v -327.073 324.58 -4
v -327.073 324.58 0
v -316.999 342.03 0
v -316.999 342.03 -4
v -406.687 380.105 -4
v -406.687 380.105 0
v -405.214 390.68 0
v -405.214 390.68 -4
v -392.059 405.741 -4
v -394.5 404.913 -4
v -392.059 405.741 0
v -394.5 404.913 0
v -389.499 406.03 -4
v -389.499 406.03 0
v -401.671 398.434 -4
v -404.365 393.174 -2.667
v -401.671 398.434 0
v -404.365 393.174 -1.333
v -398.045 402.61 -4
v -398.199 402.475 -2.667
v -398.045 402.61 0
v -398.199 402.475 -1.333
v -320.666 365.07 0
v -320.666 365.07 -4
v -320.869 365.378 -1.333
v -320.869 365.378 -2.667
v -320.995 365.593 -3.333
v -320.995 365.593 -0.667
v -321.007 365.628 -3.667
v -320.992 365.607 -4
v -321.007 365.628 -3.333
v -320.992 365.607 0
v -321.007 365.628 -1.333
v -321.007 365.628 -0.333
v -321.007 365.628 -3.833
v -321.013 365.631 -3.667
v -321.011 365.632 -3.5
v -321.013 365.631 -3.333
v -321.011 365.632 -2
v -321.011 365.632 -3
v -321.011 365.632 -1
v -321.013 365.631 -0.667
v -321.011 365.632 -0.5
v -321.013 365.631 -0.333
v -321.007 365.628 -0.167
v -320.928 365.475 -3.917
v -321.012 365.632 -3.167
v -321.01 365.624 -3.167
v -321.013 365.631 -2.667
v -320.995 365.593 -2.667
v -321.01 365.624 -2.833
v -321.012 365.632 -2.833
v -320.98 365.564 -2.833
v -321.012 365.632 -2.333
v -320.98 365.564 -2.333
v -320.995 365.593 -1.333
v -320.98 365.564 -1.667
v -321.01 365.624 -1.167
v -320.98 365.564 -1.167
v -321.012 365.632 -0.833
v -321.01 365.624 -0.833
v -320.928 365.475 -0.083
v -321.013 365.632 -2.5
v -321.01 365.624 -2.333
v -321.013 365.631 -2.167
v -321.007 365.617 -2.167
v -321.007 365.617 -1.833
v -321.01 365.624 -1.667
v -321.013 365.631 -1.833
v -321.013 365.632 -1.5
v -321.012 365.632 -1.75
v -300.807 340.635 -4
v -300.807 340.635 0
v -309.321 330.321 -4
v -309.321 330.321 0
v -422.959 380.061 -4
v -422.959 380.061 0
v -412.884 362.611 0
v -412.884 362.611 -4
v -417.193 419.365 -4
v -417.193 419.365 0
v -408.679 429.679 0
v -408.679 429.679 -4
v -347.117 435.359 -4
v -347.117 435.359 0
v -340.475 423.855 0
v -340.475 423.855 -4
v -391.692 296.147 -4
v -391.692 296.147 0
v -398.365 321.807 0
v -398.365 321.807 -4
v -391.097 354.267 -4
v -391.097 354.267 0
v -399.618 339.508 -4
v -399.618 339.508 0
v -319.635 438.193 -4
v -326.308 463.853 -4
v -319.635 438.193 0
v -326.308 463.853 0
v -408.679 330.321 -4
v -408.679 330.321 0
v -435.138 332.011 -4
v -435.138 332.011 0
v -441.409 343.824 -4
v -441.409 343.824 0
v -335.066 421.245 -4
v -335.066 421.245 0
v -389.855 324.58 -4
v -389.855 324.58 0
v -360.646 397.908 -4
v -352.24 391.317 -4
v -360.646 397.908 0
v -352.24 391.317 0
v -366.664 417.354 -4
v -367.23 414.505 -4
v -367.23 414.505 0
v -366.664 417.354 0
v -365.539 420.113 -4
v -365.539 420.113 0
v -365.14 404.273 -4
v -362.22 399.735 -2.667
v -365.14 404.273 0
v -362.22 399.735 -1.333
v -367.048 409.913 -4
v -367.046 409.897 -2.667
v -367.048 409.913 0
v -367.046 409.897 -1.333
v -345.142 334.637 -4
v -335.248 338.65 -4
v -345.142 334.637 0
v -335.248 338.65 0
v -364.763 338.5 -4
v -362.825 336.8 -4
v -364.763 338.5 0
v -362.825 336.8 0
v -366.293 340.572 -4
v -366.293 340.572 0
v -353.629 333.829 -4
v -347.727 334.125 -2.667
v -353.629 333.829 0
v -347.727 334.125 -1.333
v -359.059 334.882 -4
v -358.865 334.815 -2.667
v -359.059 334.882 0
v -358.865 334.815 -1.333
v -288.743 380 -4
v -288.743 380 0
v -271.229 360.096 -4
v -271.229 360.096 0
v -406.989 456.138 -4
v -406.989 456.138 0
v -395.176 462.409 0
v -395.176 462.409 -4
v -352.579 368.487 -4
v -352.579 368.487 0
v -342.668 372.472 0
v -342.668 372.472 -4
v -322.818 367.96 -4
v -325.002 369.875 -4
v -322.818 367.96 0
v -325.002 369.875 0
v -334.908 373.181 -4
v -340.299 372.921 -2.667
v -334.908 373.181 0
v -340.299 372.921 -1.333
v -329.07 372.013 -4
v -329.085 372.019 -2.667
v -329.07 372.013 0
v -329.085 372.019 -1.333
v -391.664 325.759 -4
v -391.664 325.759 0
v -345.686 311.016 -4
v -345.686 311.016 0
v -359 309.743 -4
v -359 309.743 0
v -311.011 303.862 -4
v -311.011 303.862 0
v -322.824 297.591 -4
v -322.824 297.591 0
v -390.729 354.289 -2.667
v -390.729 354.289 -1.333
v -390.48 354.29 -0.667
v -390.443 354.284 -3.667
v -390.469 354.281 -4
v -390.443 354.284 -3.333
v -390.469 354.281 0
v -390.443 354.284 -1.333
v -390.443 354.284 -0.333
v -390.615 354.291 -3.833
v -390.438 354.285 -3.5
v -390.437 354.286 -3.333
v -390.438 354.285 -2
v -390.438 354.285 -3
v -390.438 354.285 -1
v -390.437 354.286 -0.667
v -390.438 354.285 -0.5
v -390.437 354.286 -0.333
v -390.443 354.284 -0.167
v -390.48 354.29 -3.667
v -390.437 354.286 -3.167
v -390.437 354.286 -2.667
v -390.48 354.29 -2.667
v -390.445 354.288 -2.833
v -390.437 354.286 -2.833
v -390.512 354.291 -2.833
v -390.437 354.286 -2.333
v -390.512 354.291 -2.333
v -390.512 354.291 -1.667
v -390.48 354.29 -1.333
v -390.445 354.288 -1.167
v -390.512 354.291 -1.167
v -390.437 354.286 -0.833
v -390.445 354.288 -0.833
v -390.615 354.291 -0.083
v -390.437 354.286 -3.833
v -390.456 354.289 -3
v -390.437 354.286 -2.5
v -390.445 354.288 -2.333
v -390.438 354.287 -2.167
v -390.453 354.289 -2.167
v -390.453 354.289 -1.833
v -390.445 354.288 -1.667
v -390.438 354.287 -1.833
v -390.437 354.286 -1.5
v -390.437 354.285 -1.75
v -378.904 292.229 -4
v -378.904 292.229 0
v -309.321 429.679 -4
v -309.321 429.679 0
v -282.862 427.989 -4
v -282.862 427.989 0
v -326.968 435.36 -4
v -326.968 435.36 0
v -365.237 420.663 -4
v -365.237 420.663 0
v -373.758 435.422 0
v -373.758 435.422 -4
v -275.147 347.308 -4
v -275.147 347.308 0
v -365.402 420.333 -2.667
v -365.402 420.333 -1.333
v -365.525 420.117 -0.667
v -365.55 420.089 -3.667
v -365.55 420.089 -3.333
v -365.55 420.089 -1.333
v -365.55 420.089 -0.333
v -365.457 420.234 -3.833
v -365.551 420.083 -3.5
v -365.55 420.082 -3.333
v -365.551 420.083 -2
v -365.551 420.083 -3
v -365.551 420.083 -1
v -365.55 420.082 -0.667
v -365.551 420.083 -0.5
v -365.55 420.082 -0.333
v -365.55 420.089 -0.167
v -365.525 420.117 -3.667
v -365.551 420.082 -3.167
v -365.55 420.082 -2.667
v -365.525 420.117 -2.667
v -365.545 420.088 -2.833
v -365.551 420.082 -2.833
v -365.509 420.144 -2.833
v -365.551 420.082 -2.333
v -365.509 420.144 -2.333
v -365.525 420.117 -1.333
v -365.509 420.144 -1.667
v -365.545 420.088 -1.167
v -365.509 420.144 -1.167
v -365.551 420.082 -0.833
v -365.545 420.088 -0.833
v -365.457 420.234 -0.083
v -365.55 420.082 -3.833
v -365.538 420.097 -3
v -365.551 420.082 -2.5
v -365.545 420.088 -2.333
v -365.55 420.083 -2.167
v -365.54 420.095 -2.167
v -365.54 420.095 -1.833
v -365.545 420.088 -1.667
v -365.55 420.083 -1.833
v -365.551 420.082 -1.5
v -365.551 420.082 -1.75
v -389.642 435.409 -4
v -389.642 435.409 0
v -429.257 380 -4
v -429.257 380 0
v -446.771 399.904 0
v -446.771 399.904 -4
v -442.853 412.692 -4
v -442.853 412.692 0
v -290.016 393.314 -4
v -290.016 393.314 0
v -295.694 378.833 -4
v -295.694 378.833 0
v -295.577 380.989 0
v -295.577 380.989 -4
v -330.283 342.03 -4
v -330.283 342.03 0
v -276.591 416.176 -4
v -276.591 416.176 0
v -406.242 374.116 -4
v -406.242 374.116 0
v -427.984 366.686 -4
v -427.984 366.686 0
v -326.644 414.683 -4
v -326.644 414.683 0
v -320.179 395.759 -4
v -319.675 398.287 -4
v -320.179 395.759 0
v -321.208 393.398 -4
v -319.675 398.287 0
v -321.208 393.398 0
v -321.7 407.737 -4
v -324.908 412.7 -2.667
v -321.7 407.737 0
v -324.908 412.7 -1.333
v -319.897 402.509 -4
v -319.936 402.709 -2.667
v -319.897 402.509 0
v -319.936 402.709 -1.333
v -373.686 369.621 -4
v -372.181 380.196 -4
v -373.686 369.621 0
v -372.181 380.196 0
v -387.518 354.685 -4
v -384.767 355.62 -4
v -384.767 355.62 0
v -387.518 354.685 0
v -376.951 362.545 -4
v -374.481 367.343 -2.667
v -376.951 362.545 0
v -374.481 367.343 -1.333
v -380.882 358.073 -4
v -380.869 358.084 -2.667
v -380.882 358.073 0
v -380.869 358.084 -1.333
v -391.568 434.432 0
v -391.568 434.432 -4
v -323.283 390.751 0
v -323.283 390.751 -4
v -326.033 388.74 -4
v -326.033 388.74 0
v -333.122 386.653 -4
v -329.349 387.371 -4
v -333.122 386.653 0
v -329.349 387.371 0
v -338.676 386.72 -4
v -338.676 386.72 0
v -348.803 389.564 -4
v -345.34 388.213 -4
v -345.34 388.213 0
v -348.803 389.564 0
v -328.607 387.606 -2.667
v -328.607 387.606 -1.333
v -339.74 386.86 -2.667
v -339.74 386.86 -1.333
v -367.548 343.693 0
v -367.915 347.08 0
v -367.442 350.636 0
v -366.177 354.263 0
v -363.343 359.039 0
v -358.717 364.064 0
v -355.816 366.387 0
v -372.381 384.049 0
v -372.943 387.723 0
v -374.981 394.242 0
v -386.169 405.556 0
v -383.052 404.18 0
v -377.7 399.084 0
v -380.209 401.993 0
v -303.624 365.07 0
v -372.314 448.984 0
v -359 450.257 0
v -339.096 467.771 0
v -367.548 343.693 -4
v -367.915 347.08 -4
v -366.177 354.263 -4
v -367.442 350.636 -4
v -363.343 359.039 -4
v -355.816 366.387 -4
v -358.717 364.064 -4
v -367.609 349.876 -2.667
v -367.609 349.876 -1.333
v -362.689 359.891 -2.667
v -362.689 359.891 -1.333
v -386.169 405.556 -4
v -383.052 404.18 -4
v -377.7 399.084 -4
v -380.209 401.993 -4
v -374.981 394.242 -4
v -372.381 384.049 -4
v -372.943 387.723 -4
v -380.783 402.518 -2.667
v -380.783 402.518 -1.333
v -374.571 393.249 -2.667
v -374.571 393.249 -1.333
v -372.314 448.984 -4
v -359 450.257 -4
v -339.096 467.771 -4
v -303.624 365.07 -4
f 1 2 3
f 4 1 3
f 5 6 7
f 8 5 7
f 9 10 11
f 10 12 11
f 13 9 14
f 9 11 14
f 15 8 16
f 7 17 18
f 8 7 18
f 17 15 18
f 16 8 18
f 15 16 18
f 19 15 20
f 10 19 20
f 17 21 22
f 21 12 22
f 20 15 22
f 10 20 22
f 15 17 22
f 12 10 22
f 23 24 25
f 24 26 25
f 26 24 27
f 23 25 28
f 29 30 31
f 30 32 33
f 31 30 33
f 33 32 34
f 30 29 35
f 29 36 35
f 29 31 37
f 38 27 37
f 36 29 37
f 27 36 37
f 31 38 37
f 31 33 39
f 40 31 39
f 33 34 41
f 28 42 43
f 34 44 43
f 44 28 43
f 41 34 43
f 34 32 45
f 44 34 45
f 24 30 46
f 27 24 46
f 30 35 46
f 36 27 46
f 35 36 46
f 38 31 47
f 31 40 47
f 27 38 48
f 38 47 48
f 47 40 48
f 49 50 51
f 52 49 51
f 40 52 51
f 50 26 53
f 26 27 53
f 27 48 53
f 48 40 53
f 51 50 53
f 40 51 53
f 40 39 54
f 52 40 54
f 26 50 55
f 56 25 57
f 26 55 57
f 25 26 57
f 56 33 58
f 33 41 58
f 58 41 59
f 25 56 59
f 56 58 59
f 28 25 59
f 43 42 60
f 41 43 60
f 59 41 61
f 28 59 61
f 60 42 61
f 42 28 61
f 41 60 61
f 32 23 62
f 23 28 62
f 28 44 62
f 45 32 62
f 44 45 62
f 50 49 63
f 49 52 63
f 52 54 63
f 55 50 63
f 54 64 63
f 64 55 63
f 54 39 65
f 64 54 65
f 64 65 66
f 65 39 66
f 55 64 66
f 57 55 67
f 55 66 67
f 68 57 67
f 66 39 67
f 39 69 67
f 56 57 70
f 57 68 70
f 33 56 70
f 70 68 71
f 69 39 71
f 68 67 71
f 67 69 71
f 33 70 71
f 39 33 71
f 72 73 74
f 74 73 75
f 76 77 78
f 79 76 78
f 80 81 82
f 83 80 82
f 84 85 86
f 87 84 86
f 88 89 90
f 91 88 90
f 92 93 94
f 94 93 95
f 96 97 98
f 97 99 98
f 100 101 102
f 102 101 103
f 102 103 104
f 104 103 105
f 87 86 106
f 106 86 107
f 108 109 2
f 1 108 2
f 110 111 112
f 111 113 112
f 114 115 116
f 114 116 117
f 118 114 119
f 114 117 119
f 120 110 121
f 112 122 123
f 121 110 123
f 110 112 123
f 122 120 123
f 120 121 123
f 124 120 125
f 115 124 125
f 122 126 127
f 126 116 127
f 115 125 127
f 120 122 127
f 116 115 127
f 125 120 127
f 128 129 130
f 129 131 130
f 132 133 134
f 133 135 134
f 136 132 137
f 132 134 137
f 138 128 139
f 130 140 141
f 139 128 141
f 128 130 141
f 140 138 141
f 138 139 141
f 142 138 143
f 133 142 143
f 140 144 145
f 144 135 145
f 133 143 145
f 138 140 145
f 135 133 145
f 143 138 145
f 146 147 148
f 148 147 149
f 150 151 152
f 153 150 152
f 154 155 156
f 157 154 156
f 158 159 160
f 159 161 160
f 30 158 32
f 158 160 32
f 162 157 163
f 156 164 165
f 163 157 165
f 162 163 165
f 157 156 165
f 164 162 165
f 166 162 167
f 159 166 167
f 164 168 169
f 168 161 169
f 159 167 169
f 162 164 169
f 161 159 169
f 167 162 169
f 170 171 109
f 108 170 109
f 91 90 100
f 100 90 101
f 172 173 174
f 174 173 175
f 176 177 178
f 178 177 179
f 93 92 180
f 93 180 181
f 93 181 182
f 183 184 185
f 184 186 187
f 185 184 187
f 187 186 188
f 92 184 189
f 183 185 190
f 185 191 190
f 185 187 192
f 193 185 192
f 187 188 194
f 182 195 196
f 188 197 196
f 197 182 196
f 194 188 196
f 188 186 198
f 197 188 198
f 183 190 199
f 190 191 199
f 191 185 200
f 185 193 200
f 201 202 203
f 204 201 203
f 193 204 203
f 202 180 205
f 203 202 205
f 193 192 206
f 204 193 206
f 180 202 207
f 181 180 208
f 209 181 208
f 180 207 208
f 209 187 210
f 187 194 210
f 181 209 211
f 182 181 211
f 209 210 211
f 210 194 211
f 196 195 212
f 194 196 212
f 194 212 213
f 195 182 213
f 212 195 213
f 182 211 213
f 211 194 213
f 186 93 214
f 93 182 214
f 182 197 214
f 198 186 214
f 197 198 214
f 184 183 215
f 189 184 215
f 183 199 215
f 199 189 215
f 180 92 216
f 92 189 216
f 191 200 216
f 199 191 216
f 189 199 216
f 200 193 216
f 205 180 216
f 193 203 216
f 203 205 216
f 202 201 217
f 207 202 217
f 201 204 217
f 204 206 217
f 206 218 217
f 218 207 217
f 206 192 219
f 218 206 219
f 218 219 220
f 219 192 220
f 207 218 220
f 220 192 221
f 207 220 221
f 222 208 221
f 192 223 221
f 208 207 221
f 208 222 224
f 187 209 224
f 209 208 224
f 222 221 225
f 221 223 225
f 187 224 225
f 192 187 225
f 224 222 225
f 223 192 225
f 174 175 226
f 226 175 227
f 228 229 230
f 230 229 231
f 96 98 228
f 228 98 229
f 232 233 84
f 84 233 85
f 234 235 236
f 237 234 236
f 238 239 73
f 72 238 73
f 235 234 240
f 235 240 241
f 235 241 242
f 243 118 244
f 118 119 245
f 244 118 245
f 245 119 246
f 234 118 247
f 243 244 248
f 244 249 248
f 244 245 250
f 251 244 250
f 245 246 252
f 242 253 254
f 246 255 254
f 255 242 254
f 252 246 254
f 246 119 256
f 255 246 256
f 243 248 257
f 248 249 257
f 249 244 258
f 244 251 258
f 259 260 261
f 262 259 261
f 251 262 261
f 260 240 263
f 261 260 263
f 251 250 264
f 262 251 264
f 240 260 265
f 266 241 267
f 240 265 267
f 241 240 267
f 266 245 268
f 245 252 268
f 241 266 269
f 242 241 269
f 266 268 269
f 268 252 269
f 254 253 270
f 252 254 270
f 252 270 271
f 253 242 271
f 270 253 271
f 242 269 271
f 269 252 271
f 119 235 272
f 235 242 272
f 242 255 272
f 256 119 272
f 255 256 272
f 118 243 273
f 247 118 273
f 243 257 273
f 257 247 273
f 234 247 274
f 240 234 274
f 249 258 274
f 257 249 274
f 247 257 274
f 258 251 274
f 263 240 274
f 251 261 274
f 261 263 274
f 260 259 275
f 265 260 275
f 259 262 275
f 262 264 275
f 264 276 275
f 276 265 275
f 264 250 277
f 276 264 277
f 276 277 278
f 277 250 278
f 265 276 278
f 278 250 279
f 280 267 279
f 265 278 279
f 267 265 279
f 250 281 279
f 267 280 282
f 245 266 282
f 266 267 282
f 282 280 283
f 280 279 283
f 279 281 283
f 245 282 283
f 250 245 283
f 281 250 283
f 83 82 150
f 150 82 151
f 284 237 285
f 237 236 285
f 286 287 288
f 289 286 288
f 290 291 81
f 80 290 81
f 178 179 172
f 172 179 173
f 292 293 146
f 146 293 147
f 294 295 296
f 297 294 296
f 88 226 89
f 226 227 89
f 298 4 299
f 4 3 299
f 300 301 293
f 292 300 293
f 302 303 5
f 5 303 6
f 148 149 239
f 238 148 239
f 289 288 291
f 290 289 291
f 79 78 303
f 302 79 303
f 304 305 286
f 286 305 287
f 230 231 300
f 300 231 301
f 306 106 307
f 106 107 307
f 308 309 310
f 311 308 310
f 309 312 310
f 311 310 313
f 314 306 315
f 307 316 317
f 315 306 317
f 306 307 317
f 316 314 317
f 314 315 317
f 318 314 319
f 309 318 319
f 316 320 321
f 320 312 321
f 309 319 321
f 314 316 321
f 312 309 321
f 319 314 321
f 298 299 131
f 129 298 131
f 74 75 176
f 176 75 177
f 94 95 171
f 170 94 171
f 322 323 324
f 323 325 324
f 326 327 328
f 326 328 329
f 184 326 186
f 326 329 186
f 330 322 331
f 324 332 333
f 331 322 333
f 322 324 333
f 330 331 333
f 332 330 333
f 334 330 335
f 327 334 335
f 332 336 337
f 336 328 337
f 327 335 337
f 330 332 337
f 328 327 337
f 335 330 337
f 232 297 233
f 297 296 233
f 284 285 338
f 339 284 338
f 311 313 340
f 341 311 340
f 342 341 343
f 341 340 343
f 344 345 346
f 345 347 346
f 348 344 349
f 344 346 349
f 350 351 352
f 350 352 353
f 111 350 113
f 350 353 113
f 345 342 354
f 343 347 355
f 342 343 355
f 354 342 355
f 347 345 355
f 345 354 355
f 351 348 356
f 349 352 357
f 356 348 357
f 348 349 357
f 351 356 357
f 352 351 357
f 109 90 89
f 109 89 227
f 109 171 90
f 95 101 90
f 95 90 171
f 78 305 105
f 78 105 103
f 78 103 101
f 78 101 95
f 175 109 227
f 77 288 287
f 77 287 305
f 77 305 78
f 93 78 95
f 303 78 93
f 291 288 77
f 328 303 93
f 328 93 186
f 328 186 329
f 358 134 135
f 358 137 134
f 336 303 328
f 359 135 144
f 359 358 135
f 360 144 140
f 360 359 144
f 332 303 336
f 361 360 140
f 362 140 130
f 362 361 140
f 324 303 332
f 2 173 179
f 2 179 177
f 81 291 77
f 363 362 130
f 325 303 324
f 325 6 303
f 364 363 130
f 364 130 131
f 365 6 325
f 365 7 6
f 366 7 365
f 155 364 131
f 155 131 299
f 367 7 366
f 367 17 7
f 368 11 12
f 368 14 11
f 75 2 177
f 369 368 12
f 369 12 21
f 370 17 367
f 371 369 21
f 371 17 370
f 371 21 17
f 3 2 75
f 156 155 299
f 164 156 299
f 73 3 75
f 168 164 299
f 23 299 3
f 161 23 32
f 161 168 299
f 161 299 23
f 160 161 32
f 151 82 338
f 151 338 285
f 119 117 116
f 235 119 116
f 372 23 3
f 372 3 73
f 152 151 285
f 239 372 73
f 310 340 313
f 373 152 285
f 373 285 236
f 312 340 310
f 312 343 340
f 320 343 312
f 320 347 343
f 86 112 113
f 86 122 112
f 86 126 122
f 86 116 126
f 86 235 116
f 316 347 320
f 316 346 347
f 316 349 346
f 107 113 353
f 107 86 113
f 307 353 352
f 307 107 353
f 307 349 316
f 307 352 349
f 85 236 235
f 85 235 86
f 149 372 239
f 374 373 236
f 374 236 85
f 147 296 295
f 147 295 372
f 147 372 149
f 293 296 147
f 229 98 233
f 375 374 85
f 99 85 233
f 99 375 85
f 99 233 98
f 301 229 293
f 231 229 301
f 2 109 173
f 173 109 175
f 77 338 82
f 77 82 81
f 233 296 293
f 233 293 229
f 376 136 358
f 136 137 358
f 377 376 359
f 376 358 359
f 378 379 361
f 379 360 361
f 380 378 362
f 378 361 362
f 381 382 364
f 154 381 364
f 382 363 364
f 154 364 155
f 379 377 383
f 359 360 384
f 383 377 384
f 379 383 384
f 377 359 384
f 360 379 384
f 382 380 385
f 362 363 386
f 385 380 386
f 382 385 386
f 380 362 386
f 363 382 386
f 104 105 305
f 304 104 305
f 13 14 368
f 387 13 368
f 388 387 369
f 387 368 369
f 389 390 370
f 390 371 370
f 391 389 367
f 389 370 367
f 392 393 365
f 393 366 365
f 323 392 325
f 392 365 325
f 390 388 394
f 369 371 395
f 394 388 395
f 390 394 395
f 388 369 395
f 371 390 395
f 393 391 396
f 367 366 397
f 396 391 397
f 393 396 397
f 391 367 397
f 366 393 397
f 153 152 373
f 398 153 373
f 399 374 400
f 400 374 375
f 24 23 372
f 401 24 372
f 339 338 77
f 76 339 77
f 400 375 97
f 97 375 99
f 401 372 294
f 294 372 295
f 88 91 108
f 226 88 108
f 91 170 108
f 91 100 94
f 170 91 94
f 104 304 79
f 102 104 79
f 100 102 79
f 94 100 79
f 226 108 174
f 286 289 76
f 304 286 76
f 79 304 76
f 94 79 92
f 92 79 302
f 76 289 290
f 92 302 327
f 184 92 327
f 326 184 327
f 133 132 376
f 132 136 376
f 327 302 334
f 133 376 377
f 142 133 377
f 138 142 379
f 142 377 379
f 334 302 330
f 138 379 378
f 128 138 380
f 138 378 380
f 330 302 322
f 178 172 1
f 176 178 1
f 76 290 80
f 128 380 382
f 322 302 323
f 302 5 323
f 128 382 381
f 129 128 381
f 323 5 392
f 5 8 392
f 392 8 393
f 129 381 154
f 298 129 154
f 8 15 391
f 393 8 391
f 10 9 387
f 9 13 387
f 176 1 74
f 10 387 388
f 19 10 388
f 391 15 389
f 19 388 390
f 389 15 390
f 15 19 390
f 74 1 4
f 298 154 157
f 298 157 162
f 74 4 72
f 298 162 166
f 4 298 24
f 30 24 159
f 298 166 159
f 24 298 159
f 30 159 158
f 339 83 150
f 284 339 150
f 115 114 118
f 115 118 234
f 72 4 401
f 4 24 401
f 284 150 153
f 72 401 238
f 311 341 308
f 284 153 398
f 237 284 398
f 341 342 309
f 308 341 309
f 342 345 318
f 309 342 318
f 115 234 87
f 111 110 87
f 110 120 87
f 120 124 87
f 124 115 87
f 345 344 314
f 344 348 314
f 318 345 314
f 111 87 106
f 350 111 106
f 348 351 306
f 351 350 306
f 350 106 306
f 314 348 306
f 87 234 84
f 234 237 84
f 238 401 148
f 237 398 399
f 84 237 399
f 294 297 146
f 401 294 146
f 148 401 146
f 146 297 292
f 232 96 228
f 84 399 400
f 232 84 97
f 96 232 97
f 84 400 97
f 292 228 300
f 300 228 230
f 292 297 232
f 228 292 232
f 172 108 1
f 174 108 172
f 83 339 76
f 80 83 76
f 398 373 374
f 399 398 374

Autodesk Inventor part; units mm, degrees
ref_plane "YZ Plane" through (0, 0, 0) normal (1, 0, 0) x (0, 1, 0)
ref_plane "XZ Plane" through (0, 0, 0) normal (0, 1, 0) x (-1, 0, 0)
ref_plane "XY Plane" through (0, 0, 0) normal (0, 0, 1) x (1, 0, 0)
ref_plane "Work Plane1" through (0, 0, 0) normal (0, 0, 1) x (1, 0, 0)
sketch "Sketch1" plane through (0, 0, 0) normal (0, 0, 1) x (1, 0, 0)
  line L0 (-320.6659, 365.07) -> (-303.6236, 365.07) projected
  spline S0 degree 3 poles (-320.9918, 365.6066) (-321.0765, 365.7292) (-320.8908, 365.3877) (-320.6659, 365.07) knots 2.320993 2.320993 2.320993 2.320993 3 3 3 3 projected
  spline S1 degree 3 poles (-352.5793, 368.487) (-340.4491, 375.5323) (-326.8416, 374.8317) (-320.9918, 365.6066) knots 3 3 3 3 3.981304 3.981304 3.981304 3.981304 projected
  spline S2 degree 3 poles (-366.293, 340.5724) (-371.0762, 348.8109) (-364.9349, 361.3096) (-352.5793, 368.487) knots 4 4 4 4 5 5 5 5 projected
  spline S3 degree 3 poles (-335.2478, 338.6495) (-347.6077, 331.4693) (-361.5095, 332.3307) (-366.293, 340.5724) knots 5 5 5 5 6 6 6 6 projected
  line L1 (-330.2832, 342.0297) -> (-335.2478, 338.6495) projected
  line L2 (-316.9989, 342.0297) -> (-330.2832, 342.0297) projected
  line L3 (-327.0734, 324.5796) -> (-316.9989, 342.0297) projected
  line L4 (-389.8551, 324.5796) -> (-327.0734, 324.5796) projected
  line L5 (-391.6641, 325.7587) -> (-389.8551, 324.5796) projected
  line L6 (-399.6179, 339.5077) -> (-391.6641, 325.7587) projected
  line L7 (-391.0968, 354.2667) -> (-399.6179, 339.5077) projected
  spline S4 degree 3 poles (-390.4692, 354.2806) (-390.3206, 354.2927) (-390.7092, 354.3026) (-391.0968, 354.2667) knots 2.320993 2.320993 2.320993 2.320993 3 3 3 3 projected
  spline S5 degree 3 poles (-372.1809, 380.196) (-372.1446, 366.1683) (-379.5551, 354.7342) (-390.4692, 354.2806) knots 3 3 3 3 3.981304 3.981304 3.981304 3.981304 projected
  spline S6 degree 3 poles (-389.4988, 406.0297) (-379.9724, 406.0529) (-372.2189, 394.485) (-372.1809, 380.196) knots 4 4 4 4 5 5 5 5 projected
  spline S7 degree 3 poles (-406.6867, 380.1052) (-406.725, 394.3993) (-399.028, 406.008) (-389.4988, 406.0297) knots 5 5 5 5 6 6 6 6 projected
  line L8 (-406.2417, 374.1157) -> (-406.6867, 380.1052) projected
  line L9 (-412.8838, 362.6111) -> (-406.2417, 374.1157) projected
  line L10 (-422.9588, 380.0609) -> (-412.8838, 362.6111) projected
  line L11 (-391.568, 434.4315) -> (-422.9588, 380.0609) projected
  line L12 (-389.6423, 435.4086) -> (-391.568, 434.4315) projected
  line L13 (-373.7584, 435.4223) -> (-389.6423, 435.4086) projected
  line L14 (-365.2373, 420.6633) -> (-373.7584, 435.4223) projected
  spline S8 degree 3 poles (-365.5391, 420.1128) (-365.6029, 419.9781) (-365.4, 420.3097) (-365.2373, 420.6633) knots 2.320993 2.320993 2.320993 2.320993 3 3 3 3 projected
  spline S9 degree 3 poles (-352.2398, 391.317) (-364.4063, 398.2994) (-370.6033, 410.4341) (-365.5391, 420.1128) knots 3 3 3 3 3.981304 3.981304 3.981304 3.981304 projected
  spline S10 degree 3 poles (-321.2082, 393.3979) (-325.9513, 385.1362) (-339.8462, 384.2054) (-352.2398, 391.317) knots 4 4 4 4 5 5 5 5 projected
  spline S11 degree 3 poles (-335.0655, 421.2453) (-322.6673, 414.1314) (-316.4624, 401.6613) (-321.2082, 393.3979) knots 5 5 5 5 6 6 6 6 projected
  line L15 (-340.4751, 423.8546) -> (-335.0655, 421.2453) projected
  line L16 (-347.1173, 435.3592) -> (-340.4751, 423.8546) projected
  line L17 (-326.9678, 435.3595) -> (-347.1173, 435.3592) projected
  line L18 (-295.577, 380.9889) -> (-326.9678, 435.3595) projected
  line L19 (-295.6936, 378.8327) -> (-295.577, 380.9889) projected
  line L20 (-303.6236, 365.07) -> (-295.6936, 378.8327) projected
  line L21 (-427.984, 366.6864) -> (-429.2569, 380) projected
  line L22 (-441.4092, 343.8238) -> (-427.984, 366.6864) projected
  line L23 (-435.1382, 332.0107) -> (-441.4092, 343.8238) projected
  line L24 (-408.6792, 330.3208) -> (-435.1382, 332.0107) projected
  line L25 (-398.3649, 321.8068) -> (-408.6792, 330.3208) projected
  line L26 (-391.6916, 296.1474) -> (-398.3649, 321.8068) projected
  line L27 (-378.9043, 292.2286) -> (-391.6916, 296.1474) projected
  line L28 (-359, 309.7431) -> (-378.9043, 292.2286) projected
  line L29 (-345.6864, 311.016) -> (-359, 309.7431) projected
  line L30 (-322.8238, 297.5908) -> (-345.6864, 311.016) projected
  line L31 (-311.0107, 303.8618) -> (-322.8238, 297.5908) projected
  line L32 (-309.3208, 330.3208) -> (-311.0107, 303.8618) projected
  line L33 (-300.8068, 340.6351) -> (-309.3208, 330.3208) projected
  line L34 (-275.1474, 347.3084) -> (-300.8068, 340.6351) projected
  line L35 (-271.2286, 360.0957) -> (-275.1474, 347.3084) projected
  line L36 (-288.7431, 380) -> (-271.2286, 360.0957) projected
  line L37 (-290.016, 393.3136) -> (-288.7431, 380) projected
  line L38 (-276.5908, 416.1762) -> (-290.016, 393.3136) projected
  line L39 (-282.8618, 427.9893) -> (-276.5908, 416.1762) projected
  line L40 (-309.3208, 429.6792) -> (-282.8618, 427.9893) projected
  line L41 (-319.6351, 438.1932) -> (-309.3208, 429.6792) projected
  line L42 (-326.3084, 463.8526) -> (-319.6351, 438.1932) projected
  line L43 (-339.0957, 467.7714) -> (-326.3084, 463.8526) projected
  line L44 (-359, 450.2569) -> (-339.0957, 467.7714) projected
  line L45 (-372.3136, 448.984) -> (-359, 450.2569) projected
  line L46 (-395.1762, 462.4092) -> (-372.3136, 448.984) projected
  line L47 (-406.9893, 456.1382) -> (-395.1762, 462.4092) projected
  line L48 (-408.6792, 429.6792) -> (-406.9893, 456.1382) projected
  line L49 (-417.1932, 419.3649) -> (-408.6792, 429.6792) projected
  line L50 (-442.8526, 412.6916) -> (-417.1932, 419.3649) projected
  line L51 (-446.7714, 399.9043) -> (-442.8526, 412.6916) projected
  line L52 (-429.2569, 380) -> (-446.7714, 399.9043) projected
  point P0 (0, 0)
extrude "Extrusion1" add sketch "Sketch1" against normal blind 4
properties part number "logoDraw" material "Wood (Cherry)"
